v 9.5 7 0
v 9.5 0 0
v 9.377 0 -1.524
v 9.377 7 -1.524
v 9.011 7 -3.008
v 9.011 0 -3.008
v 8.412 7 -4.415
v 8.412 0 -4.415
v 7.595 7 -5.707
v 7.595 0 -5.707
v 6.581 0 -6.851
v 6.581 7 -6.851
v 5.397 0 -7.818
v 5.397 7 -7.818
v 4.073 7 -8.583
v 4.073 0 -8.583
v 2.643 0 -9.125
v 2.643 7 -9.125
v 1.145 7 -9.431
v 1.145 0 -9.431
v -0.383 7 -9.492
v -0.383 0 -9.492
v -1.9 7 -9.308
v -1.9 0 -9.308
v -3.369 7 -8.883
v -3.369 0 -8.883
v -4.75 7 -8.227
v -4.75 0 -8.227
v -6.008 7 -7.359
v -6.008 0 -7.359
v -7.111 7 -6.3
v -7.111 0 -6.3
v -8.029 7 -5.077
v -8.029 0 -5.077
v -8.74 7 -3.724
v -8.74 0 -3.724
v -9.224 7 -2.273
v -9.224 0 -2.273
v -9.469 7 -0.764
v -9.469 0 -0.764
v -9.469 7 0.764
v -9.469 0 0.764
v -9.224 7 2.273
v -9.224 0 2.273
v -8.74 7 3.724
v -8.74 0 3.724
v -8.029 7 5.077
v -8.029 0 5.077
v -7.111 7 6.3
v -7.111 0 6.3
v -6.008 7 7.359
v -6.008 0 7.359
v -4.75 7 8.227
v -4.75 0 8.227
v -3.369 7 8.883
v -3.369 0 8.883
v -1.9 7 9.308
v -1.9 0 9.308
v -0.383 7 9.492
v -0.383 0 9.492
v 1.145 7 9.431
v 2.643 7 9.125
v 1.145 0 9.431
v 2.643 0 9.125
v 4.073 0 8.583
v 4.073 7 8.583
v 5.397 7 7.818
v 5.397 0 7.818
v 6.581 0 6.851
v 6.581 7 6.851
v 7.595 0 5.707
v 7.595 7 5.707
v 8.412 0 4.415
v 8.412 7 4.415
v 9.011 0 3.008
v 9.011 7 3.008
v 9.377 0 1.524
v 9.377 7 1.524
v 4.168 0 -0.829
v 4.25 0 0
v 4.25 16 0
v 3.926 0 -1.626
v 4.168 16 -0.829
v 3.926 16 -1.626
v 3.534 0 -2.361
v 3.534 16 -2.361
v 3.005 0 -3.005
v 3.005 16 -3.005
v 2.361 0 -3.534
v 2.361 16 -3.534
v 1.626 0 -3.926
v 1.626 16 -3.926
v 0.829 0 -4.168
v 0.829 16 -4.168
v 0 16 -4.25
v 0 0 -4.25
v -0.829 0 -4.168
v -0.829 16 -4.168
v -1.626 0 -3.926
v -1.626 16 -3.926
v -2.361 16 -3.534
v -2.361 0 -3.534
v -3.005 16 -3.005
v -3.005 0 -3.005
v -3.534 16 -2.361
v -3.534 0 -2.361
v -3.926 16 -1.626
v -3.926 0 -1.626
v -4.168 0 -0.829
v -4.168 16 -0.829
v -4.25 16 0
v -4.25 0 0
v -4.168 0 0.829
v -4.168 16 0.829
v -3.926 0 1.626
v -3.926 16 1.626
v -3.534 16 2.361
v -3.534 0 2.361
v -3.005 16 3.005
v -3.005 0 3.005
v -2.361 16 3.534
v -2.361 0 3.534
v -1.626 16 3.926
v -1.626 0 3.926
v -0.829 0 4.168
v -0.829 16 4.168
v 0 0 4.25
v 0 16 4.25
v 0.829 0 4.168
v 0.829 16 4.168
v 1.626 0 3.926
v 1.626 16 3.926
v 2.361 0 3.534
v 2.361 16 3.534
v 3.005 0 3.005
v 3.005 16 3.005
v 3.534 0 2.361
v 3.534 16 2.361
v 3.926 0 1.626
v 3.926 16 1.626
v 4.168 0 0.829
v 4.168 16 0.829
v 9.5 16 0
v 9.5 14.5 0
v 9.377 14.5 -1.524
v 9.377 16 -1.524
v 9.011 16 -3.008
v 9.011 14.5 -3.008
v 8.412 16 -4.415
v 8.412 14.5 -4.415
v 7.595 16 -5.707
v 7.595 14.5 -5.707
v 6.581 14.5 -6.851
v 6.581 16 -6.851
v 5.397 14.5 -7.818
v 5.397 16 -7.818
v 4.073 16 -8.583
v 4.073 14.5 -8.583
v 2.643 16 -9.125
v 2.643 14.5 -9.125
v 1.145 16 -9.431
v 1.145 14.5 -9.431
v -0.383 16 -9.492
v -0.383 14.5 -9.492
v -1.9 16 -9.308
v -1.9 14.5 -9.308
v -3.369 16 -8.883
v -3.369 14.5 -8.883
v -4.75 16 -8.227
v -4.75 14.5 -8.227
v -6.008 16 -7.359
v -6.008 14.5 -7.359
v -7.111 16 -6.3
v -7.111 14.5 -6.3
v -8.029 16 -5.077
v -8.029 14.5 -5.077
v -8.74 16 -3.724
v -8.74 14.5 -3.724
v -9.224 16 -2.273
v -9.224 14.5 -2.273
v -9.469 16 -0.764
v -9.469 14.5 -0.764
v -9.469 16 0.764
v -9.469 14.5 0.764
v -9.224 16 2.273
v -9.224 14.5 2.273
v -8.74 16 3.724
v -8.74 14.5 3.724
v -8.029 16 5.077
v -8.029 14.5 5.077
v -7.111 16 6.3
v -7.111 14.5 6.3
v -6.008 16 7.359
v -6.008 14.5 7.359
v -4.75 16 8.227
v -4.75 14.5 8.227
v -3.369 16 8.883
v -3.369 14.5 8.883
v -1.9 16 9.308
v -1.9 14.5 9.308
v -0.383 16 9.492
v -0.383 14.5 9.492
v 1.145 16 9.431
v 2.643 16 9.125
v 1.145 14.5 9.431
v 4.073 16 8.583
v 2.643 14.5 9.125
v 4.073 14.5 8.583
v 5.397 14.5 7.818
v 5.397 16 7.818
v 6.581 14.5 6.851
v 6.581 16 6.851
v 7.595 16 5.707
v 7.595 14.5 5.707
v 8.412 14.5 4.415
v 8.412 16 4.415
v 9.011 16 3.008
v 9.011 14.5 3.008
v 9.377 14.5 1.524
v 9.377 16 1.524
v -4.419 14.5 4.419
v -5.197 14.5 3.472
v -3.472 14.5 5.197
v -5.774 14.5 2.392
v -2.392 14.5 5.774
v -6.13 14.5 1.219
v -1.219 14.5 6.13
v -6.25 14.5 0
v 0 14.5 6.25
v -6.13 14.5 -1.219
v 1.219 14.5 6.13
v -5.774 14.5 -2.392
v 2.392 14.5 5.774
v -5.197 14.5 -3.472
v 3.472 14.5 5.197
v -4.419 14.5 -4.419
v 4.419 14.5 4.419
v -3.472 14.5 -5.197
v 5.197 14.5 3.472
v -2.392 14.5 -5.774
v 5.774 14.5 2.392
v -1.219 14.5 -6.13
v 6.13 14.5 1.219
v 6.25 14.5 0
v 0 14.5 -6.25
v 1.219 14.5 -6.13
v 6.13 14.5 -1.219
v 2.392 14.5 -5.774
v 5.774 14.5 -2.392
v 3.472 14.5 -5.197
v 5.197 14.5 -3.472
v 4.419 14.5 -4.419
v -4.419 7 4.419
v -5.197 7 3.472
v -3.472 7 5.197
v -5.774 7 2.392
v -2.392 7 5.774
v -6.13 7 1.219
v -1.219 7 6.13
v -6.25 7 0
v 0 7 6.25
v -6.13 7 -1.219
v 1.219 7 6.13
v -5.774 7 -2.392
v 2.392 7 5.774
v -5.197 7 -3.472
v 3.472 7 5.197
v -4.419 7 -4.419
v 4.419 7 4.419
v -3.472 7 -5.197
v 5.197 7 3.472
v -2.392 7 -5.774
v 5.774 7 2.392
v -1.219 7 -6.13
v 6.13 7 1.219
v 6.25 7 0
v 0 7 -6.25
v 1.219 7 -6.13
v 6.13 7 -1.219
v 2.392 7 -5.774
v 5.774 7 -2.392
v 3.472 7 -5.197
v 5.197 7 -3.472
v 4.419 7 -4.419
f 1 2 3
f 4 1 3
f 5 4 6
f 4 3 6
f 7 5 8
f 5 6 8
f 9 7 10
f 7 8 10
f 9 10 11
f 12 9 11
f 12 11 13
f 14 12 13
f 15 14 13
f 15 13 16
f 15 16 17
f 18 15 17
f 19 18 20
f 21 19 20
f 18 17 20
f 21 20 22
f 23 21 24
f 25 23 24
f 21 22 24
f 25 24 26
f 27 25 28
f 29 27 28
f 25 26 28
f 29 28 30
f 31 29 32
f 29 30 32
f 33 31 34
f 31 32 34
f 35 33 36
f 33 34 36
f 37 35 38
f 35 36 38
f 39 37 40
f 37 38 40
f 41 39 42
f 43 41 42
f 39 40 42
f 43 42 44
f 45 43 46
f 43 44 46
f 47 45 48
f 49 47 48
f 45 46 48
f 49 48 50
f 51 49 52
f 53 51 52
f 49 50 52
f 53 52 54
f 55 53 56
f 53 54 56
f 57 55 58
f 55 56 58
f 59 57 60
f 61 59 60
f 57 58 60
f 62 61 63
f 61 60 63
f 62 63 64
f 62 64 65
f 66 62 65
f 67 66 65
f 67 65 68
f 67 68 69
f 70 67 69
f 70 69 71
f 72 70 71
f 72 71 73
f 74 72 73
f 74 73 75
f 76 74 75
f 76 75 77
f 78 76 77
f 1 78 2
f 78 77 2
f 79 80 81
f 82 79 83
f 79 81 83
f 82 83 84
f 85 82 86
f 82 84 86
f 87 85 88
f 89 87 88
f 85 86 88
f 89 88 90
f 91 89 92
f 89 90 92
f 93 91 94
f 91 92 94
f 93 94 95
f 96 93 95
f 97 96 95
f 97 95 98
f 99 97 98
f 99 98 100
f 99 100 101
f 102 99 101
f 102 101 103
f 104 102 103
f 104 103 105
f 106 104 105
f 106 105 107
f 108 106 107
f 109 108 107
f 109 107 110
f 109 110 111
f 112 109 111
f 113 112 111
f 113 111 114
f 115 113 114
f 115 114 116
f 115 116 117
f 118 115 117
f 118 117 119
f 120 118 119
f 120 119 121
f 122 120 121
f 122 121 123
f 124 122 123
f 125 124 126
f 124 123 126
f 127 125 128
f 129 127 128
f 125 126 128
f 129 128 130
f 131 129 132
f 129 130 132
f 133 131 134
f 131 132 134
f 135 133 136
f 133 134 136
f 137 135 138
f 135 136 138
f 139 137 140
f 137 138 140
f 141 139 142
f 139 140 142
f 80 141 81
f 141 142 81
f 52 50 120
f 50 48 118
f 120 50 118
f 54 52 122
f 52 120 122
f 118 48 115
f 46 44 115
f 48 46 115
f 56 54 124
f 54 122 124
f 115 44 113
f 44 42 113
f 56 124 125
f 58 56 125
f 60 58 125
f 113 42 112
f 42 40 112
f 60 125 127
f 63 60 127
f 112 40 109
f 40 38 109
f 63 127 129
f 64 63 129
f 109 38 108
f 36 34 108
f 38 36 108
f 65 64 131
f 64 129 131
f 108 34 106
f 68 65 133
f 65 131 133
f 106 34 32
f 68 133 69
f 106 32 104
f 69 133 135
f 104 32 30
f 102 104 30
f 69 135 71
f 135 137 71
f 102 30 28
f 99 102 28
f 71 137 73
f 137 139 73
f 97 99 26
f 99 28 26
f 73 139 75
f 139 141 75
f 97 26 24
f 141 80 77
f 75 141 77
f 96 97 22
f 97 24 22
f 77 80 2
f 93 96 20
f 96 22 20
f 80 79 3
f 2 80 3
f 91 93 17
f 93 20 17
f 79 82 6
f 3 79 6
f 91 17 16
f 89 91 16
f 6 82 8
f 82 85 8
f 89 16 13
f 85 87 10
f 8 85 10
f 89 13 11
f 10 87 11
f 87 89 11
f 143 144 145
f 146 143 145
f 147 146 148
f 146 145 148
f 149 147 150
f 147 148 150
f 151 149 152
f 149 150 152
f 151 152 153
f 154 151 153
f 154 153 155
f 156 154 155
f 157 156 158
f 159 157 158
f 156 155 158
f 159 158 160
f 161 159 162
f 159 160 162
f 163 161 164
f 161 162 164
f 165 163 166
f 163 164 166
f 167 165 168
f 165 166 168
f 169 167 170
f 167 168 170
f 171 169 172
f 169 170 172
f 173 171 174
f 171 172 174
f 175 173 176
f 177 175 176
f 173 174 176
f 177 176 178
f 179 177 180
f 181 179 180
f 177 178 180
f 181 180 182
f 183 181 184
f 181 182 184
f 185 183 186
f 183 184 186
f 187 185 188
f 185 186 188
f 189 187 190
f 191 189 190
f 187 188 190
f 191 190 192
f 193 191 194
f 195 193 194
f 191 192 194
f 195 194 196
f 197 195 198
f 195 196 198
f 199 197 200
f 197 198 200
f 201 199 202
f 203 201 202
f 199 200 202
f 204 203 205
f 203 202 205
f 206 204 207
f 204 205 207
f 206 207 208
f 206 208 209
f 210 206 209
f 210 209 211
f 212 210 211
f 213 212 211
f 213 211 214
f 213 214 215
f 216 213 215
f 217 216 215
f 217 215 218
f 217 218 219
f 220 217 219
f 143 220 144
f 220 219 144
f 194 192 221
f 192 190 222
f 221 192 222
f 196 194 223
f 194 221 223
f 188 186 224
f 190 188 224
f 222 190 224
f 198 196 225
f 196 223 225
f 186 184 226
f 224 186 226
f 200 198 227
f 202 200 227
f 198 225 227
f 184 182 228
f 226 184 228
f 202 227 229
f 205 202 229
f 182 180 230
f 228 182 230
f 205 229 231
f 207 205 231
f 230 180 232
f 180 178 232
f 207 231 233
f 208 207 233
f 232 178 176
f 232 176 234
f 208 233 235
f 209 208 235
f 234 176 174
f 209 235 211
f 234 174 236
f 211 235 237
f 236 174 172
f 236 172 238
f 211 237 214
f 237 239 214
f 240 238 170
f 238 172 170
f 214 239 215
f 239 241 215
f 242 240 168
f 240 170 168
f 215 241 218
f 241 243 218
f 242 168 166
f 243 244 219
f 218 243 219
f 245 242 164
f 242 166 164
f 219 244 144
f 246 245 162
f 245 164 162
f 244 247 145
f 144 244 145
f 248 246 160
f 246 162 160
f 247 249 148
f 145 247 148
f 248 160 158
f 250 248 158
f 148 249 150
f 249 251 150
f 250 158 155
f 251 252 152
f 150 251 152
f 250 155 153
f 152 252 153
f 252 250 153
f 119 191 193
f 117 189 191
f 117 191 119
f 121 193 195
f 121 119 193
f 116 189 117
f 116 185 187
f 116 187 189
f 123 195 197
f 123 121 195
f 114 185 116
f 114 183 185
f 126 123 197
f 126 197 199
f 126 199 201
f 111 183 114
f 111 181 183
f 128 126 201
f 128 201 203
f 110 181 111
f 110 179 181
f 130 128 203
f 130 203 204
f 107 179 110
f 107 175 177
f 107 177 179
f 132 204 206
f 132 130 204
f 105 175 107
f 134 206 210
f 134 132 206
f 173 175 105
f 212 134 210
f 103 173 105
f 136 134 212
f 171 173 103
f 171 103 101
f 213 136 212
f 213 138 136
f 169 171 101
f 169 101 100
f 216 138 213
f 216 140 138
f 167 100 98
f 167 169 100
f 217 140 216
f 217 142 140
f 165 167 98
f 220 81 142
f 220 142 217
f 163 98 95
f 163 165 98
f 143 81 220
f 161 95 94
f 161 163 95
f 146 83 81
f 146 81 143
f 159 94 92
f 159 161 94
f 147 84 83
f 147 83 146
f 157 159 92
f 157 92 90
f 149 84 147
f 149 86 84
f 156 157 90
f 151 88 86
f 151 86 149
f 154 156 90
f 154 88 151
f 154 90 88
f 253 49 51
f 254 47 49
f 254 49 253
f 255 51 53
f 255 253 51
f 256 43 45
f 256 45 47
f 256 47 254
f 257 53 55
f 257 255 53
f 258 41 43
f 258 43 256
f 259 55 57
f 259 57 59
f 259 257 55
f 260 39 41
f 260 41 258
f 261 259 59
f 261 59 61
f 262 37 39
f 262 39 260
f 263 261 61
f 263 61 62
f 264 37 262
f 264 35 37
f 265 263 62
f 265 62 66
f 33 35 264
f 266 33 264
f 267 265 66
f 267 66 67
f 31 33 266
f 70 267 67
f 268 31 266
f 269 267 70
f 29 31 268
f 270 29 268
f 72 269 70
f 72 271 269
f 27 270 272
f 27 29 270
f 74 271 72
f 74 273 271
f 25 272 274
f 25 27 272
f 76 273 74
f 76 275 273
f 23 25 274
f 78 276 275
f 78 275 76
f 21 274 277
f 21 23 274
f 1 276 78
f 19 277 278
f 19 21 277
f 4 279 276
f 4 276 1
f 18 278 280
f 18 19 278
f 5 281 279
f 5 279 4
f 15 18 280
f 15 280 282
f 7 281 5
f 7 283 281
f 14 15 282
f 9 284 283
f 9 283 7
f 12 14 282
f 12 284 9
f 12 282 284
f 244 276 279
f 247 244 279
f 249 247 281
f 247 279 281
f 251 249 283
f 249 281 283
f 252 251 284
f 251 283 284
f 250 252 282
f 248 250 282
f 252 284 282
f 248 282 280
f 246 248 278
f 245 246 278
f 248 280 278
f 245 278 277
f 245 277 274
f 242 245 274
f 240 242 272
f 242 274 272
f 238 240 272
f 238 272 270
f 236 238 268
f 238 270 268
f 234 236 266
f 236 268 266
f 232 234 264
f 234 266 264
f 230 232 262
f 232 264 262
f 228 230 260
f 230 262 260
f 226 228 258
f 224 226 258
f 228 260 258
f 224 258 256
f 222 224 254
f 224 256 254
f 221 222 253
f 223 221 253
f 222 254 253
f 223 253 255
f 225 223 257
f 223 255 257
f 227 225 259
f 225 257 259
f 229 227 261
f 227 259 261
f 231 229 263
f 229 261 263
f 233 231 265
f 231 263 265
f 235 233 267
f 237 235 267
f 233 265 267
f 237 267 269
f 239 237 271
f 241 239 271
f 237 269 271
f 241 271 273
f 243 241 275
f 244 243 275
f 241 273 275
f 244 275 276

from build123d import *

# Parameters (mm, degrees)
SKETCH1_R           = 9.5
BOSS_EXTRUDE1_DEPTH = 7
SKETCH2_R           = 6.25
BOSS_EXTRUDE2_DEPTH = 7.5
SKETCH3_R           = 9.5
BOSS_EXTRUDE3_DEPTH = 1.5
SKETCH4_R           = 4.25
CUT_EXTRUDE1_DEPTH  = 17


with BuildPart() as part:
    # Sketch1 → Boss-Extrude1 (new body)
    with BuildSketch(Plane(origin=(0, 0, 0), x_dir=(1, 0, 0), z_dir=(0, 1, 0))):
        Circle(SKETCH1_R)
    extrude(amount=BOSS_EXTRUDE1_DEPTH)

    # Sketch2 → Boss-Extrude2 (add)
    with BuildSketch(Plane(origin=(0, 7, 0), x_dir=(1, 0, 0), z_dir=(0, 1, 0))):
        Circle(SKETCH2_R)
    extrude(amount=BOSS_EXTRUDE2_DEPTH)

    # Sketch3 → Boss-Extrude3 (add)
    with BuildSketch(Plane(origin=(0, 14.5, 0), x_dir=(1, 0, 0), z_dir=(0, 1, 0))):
        Circle(SKETCH3_R)
    extrude(amount=BOSS_EXTRUDE3_DEPTH)

    # Sketch4 → Cut-Extrude1 (cut, through all)
    with BuildSketch(Plane(origin=(0, 16, 0), x_dir=(1, 0, 0), z_dir=(0, 1, 0))):
        Circle(SKETCH4_R)
    extrude(amount=-CUT_EXTRUDE1_DEPTH, mode=Mode.SUBTRACT)


solid = part.part
